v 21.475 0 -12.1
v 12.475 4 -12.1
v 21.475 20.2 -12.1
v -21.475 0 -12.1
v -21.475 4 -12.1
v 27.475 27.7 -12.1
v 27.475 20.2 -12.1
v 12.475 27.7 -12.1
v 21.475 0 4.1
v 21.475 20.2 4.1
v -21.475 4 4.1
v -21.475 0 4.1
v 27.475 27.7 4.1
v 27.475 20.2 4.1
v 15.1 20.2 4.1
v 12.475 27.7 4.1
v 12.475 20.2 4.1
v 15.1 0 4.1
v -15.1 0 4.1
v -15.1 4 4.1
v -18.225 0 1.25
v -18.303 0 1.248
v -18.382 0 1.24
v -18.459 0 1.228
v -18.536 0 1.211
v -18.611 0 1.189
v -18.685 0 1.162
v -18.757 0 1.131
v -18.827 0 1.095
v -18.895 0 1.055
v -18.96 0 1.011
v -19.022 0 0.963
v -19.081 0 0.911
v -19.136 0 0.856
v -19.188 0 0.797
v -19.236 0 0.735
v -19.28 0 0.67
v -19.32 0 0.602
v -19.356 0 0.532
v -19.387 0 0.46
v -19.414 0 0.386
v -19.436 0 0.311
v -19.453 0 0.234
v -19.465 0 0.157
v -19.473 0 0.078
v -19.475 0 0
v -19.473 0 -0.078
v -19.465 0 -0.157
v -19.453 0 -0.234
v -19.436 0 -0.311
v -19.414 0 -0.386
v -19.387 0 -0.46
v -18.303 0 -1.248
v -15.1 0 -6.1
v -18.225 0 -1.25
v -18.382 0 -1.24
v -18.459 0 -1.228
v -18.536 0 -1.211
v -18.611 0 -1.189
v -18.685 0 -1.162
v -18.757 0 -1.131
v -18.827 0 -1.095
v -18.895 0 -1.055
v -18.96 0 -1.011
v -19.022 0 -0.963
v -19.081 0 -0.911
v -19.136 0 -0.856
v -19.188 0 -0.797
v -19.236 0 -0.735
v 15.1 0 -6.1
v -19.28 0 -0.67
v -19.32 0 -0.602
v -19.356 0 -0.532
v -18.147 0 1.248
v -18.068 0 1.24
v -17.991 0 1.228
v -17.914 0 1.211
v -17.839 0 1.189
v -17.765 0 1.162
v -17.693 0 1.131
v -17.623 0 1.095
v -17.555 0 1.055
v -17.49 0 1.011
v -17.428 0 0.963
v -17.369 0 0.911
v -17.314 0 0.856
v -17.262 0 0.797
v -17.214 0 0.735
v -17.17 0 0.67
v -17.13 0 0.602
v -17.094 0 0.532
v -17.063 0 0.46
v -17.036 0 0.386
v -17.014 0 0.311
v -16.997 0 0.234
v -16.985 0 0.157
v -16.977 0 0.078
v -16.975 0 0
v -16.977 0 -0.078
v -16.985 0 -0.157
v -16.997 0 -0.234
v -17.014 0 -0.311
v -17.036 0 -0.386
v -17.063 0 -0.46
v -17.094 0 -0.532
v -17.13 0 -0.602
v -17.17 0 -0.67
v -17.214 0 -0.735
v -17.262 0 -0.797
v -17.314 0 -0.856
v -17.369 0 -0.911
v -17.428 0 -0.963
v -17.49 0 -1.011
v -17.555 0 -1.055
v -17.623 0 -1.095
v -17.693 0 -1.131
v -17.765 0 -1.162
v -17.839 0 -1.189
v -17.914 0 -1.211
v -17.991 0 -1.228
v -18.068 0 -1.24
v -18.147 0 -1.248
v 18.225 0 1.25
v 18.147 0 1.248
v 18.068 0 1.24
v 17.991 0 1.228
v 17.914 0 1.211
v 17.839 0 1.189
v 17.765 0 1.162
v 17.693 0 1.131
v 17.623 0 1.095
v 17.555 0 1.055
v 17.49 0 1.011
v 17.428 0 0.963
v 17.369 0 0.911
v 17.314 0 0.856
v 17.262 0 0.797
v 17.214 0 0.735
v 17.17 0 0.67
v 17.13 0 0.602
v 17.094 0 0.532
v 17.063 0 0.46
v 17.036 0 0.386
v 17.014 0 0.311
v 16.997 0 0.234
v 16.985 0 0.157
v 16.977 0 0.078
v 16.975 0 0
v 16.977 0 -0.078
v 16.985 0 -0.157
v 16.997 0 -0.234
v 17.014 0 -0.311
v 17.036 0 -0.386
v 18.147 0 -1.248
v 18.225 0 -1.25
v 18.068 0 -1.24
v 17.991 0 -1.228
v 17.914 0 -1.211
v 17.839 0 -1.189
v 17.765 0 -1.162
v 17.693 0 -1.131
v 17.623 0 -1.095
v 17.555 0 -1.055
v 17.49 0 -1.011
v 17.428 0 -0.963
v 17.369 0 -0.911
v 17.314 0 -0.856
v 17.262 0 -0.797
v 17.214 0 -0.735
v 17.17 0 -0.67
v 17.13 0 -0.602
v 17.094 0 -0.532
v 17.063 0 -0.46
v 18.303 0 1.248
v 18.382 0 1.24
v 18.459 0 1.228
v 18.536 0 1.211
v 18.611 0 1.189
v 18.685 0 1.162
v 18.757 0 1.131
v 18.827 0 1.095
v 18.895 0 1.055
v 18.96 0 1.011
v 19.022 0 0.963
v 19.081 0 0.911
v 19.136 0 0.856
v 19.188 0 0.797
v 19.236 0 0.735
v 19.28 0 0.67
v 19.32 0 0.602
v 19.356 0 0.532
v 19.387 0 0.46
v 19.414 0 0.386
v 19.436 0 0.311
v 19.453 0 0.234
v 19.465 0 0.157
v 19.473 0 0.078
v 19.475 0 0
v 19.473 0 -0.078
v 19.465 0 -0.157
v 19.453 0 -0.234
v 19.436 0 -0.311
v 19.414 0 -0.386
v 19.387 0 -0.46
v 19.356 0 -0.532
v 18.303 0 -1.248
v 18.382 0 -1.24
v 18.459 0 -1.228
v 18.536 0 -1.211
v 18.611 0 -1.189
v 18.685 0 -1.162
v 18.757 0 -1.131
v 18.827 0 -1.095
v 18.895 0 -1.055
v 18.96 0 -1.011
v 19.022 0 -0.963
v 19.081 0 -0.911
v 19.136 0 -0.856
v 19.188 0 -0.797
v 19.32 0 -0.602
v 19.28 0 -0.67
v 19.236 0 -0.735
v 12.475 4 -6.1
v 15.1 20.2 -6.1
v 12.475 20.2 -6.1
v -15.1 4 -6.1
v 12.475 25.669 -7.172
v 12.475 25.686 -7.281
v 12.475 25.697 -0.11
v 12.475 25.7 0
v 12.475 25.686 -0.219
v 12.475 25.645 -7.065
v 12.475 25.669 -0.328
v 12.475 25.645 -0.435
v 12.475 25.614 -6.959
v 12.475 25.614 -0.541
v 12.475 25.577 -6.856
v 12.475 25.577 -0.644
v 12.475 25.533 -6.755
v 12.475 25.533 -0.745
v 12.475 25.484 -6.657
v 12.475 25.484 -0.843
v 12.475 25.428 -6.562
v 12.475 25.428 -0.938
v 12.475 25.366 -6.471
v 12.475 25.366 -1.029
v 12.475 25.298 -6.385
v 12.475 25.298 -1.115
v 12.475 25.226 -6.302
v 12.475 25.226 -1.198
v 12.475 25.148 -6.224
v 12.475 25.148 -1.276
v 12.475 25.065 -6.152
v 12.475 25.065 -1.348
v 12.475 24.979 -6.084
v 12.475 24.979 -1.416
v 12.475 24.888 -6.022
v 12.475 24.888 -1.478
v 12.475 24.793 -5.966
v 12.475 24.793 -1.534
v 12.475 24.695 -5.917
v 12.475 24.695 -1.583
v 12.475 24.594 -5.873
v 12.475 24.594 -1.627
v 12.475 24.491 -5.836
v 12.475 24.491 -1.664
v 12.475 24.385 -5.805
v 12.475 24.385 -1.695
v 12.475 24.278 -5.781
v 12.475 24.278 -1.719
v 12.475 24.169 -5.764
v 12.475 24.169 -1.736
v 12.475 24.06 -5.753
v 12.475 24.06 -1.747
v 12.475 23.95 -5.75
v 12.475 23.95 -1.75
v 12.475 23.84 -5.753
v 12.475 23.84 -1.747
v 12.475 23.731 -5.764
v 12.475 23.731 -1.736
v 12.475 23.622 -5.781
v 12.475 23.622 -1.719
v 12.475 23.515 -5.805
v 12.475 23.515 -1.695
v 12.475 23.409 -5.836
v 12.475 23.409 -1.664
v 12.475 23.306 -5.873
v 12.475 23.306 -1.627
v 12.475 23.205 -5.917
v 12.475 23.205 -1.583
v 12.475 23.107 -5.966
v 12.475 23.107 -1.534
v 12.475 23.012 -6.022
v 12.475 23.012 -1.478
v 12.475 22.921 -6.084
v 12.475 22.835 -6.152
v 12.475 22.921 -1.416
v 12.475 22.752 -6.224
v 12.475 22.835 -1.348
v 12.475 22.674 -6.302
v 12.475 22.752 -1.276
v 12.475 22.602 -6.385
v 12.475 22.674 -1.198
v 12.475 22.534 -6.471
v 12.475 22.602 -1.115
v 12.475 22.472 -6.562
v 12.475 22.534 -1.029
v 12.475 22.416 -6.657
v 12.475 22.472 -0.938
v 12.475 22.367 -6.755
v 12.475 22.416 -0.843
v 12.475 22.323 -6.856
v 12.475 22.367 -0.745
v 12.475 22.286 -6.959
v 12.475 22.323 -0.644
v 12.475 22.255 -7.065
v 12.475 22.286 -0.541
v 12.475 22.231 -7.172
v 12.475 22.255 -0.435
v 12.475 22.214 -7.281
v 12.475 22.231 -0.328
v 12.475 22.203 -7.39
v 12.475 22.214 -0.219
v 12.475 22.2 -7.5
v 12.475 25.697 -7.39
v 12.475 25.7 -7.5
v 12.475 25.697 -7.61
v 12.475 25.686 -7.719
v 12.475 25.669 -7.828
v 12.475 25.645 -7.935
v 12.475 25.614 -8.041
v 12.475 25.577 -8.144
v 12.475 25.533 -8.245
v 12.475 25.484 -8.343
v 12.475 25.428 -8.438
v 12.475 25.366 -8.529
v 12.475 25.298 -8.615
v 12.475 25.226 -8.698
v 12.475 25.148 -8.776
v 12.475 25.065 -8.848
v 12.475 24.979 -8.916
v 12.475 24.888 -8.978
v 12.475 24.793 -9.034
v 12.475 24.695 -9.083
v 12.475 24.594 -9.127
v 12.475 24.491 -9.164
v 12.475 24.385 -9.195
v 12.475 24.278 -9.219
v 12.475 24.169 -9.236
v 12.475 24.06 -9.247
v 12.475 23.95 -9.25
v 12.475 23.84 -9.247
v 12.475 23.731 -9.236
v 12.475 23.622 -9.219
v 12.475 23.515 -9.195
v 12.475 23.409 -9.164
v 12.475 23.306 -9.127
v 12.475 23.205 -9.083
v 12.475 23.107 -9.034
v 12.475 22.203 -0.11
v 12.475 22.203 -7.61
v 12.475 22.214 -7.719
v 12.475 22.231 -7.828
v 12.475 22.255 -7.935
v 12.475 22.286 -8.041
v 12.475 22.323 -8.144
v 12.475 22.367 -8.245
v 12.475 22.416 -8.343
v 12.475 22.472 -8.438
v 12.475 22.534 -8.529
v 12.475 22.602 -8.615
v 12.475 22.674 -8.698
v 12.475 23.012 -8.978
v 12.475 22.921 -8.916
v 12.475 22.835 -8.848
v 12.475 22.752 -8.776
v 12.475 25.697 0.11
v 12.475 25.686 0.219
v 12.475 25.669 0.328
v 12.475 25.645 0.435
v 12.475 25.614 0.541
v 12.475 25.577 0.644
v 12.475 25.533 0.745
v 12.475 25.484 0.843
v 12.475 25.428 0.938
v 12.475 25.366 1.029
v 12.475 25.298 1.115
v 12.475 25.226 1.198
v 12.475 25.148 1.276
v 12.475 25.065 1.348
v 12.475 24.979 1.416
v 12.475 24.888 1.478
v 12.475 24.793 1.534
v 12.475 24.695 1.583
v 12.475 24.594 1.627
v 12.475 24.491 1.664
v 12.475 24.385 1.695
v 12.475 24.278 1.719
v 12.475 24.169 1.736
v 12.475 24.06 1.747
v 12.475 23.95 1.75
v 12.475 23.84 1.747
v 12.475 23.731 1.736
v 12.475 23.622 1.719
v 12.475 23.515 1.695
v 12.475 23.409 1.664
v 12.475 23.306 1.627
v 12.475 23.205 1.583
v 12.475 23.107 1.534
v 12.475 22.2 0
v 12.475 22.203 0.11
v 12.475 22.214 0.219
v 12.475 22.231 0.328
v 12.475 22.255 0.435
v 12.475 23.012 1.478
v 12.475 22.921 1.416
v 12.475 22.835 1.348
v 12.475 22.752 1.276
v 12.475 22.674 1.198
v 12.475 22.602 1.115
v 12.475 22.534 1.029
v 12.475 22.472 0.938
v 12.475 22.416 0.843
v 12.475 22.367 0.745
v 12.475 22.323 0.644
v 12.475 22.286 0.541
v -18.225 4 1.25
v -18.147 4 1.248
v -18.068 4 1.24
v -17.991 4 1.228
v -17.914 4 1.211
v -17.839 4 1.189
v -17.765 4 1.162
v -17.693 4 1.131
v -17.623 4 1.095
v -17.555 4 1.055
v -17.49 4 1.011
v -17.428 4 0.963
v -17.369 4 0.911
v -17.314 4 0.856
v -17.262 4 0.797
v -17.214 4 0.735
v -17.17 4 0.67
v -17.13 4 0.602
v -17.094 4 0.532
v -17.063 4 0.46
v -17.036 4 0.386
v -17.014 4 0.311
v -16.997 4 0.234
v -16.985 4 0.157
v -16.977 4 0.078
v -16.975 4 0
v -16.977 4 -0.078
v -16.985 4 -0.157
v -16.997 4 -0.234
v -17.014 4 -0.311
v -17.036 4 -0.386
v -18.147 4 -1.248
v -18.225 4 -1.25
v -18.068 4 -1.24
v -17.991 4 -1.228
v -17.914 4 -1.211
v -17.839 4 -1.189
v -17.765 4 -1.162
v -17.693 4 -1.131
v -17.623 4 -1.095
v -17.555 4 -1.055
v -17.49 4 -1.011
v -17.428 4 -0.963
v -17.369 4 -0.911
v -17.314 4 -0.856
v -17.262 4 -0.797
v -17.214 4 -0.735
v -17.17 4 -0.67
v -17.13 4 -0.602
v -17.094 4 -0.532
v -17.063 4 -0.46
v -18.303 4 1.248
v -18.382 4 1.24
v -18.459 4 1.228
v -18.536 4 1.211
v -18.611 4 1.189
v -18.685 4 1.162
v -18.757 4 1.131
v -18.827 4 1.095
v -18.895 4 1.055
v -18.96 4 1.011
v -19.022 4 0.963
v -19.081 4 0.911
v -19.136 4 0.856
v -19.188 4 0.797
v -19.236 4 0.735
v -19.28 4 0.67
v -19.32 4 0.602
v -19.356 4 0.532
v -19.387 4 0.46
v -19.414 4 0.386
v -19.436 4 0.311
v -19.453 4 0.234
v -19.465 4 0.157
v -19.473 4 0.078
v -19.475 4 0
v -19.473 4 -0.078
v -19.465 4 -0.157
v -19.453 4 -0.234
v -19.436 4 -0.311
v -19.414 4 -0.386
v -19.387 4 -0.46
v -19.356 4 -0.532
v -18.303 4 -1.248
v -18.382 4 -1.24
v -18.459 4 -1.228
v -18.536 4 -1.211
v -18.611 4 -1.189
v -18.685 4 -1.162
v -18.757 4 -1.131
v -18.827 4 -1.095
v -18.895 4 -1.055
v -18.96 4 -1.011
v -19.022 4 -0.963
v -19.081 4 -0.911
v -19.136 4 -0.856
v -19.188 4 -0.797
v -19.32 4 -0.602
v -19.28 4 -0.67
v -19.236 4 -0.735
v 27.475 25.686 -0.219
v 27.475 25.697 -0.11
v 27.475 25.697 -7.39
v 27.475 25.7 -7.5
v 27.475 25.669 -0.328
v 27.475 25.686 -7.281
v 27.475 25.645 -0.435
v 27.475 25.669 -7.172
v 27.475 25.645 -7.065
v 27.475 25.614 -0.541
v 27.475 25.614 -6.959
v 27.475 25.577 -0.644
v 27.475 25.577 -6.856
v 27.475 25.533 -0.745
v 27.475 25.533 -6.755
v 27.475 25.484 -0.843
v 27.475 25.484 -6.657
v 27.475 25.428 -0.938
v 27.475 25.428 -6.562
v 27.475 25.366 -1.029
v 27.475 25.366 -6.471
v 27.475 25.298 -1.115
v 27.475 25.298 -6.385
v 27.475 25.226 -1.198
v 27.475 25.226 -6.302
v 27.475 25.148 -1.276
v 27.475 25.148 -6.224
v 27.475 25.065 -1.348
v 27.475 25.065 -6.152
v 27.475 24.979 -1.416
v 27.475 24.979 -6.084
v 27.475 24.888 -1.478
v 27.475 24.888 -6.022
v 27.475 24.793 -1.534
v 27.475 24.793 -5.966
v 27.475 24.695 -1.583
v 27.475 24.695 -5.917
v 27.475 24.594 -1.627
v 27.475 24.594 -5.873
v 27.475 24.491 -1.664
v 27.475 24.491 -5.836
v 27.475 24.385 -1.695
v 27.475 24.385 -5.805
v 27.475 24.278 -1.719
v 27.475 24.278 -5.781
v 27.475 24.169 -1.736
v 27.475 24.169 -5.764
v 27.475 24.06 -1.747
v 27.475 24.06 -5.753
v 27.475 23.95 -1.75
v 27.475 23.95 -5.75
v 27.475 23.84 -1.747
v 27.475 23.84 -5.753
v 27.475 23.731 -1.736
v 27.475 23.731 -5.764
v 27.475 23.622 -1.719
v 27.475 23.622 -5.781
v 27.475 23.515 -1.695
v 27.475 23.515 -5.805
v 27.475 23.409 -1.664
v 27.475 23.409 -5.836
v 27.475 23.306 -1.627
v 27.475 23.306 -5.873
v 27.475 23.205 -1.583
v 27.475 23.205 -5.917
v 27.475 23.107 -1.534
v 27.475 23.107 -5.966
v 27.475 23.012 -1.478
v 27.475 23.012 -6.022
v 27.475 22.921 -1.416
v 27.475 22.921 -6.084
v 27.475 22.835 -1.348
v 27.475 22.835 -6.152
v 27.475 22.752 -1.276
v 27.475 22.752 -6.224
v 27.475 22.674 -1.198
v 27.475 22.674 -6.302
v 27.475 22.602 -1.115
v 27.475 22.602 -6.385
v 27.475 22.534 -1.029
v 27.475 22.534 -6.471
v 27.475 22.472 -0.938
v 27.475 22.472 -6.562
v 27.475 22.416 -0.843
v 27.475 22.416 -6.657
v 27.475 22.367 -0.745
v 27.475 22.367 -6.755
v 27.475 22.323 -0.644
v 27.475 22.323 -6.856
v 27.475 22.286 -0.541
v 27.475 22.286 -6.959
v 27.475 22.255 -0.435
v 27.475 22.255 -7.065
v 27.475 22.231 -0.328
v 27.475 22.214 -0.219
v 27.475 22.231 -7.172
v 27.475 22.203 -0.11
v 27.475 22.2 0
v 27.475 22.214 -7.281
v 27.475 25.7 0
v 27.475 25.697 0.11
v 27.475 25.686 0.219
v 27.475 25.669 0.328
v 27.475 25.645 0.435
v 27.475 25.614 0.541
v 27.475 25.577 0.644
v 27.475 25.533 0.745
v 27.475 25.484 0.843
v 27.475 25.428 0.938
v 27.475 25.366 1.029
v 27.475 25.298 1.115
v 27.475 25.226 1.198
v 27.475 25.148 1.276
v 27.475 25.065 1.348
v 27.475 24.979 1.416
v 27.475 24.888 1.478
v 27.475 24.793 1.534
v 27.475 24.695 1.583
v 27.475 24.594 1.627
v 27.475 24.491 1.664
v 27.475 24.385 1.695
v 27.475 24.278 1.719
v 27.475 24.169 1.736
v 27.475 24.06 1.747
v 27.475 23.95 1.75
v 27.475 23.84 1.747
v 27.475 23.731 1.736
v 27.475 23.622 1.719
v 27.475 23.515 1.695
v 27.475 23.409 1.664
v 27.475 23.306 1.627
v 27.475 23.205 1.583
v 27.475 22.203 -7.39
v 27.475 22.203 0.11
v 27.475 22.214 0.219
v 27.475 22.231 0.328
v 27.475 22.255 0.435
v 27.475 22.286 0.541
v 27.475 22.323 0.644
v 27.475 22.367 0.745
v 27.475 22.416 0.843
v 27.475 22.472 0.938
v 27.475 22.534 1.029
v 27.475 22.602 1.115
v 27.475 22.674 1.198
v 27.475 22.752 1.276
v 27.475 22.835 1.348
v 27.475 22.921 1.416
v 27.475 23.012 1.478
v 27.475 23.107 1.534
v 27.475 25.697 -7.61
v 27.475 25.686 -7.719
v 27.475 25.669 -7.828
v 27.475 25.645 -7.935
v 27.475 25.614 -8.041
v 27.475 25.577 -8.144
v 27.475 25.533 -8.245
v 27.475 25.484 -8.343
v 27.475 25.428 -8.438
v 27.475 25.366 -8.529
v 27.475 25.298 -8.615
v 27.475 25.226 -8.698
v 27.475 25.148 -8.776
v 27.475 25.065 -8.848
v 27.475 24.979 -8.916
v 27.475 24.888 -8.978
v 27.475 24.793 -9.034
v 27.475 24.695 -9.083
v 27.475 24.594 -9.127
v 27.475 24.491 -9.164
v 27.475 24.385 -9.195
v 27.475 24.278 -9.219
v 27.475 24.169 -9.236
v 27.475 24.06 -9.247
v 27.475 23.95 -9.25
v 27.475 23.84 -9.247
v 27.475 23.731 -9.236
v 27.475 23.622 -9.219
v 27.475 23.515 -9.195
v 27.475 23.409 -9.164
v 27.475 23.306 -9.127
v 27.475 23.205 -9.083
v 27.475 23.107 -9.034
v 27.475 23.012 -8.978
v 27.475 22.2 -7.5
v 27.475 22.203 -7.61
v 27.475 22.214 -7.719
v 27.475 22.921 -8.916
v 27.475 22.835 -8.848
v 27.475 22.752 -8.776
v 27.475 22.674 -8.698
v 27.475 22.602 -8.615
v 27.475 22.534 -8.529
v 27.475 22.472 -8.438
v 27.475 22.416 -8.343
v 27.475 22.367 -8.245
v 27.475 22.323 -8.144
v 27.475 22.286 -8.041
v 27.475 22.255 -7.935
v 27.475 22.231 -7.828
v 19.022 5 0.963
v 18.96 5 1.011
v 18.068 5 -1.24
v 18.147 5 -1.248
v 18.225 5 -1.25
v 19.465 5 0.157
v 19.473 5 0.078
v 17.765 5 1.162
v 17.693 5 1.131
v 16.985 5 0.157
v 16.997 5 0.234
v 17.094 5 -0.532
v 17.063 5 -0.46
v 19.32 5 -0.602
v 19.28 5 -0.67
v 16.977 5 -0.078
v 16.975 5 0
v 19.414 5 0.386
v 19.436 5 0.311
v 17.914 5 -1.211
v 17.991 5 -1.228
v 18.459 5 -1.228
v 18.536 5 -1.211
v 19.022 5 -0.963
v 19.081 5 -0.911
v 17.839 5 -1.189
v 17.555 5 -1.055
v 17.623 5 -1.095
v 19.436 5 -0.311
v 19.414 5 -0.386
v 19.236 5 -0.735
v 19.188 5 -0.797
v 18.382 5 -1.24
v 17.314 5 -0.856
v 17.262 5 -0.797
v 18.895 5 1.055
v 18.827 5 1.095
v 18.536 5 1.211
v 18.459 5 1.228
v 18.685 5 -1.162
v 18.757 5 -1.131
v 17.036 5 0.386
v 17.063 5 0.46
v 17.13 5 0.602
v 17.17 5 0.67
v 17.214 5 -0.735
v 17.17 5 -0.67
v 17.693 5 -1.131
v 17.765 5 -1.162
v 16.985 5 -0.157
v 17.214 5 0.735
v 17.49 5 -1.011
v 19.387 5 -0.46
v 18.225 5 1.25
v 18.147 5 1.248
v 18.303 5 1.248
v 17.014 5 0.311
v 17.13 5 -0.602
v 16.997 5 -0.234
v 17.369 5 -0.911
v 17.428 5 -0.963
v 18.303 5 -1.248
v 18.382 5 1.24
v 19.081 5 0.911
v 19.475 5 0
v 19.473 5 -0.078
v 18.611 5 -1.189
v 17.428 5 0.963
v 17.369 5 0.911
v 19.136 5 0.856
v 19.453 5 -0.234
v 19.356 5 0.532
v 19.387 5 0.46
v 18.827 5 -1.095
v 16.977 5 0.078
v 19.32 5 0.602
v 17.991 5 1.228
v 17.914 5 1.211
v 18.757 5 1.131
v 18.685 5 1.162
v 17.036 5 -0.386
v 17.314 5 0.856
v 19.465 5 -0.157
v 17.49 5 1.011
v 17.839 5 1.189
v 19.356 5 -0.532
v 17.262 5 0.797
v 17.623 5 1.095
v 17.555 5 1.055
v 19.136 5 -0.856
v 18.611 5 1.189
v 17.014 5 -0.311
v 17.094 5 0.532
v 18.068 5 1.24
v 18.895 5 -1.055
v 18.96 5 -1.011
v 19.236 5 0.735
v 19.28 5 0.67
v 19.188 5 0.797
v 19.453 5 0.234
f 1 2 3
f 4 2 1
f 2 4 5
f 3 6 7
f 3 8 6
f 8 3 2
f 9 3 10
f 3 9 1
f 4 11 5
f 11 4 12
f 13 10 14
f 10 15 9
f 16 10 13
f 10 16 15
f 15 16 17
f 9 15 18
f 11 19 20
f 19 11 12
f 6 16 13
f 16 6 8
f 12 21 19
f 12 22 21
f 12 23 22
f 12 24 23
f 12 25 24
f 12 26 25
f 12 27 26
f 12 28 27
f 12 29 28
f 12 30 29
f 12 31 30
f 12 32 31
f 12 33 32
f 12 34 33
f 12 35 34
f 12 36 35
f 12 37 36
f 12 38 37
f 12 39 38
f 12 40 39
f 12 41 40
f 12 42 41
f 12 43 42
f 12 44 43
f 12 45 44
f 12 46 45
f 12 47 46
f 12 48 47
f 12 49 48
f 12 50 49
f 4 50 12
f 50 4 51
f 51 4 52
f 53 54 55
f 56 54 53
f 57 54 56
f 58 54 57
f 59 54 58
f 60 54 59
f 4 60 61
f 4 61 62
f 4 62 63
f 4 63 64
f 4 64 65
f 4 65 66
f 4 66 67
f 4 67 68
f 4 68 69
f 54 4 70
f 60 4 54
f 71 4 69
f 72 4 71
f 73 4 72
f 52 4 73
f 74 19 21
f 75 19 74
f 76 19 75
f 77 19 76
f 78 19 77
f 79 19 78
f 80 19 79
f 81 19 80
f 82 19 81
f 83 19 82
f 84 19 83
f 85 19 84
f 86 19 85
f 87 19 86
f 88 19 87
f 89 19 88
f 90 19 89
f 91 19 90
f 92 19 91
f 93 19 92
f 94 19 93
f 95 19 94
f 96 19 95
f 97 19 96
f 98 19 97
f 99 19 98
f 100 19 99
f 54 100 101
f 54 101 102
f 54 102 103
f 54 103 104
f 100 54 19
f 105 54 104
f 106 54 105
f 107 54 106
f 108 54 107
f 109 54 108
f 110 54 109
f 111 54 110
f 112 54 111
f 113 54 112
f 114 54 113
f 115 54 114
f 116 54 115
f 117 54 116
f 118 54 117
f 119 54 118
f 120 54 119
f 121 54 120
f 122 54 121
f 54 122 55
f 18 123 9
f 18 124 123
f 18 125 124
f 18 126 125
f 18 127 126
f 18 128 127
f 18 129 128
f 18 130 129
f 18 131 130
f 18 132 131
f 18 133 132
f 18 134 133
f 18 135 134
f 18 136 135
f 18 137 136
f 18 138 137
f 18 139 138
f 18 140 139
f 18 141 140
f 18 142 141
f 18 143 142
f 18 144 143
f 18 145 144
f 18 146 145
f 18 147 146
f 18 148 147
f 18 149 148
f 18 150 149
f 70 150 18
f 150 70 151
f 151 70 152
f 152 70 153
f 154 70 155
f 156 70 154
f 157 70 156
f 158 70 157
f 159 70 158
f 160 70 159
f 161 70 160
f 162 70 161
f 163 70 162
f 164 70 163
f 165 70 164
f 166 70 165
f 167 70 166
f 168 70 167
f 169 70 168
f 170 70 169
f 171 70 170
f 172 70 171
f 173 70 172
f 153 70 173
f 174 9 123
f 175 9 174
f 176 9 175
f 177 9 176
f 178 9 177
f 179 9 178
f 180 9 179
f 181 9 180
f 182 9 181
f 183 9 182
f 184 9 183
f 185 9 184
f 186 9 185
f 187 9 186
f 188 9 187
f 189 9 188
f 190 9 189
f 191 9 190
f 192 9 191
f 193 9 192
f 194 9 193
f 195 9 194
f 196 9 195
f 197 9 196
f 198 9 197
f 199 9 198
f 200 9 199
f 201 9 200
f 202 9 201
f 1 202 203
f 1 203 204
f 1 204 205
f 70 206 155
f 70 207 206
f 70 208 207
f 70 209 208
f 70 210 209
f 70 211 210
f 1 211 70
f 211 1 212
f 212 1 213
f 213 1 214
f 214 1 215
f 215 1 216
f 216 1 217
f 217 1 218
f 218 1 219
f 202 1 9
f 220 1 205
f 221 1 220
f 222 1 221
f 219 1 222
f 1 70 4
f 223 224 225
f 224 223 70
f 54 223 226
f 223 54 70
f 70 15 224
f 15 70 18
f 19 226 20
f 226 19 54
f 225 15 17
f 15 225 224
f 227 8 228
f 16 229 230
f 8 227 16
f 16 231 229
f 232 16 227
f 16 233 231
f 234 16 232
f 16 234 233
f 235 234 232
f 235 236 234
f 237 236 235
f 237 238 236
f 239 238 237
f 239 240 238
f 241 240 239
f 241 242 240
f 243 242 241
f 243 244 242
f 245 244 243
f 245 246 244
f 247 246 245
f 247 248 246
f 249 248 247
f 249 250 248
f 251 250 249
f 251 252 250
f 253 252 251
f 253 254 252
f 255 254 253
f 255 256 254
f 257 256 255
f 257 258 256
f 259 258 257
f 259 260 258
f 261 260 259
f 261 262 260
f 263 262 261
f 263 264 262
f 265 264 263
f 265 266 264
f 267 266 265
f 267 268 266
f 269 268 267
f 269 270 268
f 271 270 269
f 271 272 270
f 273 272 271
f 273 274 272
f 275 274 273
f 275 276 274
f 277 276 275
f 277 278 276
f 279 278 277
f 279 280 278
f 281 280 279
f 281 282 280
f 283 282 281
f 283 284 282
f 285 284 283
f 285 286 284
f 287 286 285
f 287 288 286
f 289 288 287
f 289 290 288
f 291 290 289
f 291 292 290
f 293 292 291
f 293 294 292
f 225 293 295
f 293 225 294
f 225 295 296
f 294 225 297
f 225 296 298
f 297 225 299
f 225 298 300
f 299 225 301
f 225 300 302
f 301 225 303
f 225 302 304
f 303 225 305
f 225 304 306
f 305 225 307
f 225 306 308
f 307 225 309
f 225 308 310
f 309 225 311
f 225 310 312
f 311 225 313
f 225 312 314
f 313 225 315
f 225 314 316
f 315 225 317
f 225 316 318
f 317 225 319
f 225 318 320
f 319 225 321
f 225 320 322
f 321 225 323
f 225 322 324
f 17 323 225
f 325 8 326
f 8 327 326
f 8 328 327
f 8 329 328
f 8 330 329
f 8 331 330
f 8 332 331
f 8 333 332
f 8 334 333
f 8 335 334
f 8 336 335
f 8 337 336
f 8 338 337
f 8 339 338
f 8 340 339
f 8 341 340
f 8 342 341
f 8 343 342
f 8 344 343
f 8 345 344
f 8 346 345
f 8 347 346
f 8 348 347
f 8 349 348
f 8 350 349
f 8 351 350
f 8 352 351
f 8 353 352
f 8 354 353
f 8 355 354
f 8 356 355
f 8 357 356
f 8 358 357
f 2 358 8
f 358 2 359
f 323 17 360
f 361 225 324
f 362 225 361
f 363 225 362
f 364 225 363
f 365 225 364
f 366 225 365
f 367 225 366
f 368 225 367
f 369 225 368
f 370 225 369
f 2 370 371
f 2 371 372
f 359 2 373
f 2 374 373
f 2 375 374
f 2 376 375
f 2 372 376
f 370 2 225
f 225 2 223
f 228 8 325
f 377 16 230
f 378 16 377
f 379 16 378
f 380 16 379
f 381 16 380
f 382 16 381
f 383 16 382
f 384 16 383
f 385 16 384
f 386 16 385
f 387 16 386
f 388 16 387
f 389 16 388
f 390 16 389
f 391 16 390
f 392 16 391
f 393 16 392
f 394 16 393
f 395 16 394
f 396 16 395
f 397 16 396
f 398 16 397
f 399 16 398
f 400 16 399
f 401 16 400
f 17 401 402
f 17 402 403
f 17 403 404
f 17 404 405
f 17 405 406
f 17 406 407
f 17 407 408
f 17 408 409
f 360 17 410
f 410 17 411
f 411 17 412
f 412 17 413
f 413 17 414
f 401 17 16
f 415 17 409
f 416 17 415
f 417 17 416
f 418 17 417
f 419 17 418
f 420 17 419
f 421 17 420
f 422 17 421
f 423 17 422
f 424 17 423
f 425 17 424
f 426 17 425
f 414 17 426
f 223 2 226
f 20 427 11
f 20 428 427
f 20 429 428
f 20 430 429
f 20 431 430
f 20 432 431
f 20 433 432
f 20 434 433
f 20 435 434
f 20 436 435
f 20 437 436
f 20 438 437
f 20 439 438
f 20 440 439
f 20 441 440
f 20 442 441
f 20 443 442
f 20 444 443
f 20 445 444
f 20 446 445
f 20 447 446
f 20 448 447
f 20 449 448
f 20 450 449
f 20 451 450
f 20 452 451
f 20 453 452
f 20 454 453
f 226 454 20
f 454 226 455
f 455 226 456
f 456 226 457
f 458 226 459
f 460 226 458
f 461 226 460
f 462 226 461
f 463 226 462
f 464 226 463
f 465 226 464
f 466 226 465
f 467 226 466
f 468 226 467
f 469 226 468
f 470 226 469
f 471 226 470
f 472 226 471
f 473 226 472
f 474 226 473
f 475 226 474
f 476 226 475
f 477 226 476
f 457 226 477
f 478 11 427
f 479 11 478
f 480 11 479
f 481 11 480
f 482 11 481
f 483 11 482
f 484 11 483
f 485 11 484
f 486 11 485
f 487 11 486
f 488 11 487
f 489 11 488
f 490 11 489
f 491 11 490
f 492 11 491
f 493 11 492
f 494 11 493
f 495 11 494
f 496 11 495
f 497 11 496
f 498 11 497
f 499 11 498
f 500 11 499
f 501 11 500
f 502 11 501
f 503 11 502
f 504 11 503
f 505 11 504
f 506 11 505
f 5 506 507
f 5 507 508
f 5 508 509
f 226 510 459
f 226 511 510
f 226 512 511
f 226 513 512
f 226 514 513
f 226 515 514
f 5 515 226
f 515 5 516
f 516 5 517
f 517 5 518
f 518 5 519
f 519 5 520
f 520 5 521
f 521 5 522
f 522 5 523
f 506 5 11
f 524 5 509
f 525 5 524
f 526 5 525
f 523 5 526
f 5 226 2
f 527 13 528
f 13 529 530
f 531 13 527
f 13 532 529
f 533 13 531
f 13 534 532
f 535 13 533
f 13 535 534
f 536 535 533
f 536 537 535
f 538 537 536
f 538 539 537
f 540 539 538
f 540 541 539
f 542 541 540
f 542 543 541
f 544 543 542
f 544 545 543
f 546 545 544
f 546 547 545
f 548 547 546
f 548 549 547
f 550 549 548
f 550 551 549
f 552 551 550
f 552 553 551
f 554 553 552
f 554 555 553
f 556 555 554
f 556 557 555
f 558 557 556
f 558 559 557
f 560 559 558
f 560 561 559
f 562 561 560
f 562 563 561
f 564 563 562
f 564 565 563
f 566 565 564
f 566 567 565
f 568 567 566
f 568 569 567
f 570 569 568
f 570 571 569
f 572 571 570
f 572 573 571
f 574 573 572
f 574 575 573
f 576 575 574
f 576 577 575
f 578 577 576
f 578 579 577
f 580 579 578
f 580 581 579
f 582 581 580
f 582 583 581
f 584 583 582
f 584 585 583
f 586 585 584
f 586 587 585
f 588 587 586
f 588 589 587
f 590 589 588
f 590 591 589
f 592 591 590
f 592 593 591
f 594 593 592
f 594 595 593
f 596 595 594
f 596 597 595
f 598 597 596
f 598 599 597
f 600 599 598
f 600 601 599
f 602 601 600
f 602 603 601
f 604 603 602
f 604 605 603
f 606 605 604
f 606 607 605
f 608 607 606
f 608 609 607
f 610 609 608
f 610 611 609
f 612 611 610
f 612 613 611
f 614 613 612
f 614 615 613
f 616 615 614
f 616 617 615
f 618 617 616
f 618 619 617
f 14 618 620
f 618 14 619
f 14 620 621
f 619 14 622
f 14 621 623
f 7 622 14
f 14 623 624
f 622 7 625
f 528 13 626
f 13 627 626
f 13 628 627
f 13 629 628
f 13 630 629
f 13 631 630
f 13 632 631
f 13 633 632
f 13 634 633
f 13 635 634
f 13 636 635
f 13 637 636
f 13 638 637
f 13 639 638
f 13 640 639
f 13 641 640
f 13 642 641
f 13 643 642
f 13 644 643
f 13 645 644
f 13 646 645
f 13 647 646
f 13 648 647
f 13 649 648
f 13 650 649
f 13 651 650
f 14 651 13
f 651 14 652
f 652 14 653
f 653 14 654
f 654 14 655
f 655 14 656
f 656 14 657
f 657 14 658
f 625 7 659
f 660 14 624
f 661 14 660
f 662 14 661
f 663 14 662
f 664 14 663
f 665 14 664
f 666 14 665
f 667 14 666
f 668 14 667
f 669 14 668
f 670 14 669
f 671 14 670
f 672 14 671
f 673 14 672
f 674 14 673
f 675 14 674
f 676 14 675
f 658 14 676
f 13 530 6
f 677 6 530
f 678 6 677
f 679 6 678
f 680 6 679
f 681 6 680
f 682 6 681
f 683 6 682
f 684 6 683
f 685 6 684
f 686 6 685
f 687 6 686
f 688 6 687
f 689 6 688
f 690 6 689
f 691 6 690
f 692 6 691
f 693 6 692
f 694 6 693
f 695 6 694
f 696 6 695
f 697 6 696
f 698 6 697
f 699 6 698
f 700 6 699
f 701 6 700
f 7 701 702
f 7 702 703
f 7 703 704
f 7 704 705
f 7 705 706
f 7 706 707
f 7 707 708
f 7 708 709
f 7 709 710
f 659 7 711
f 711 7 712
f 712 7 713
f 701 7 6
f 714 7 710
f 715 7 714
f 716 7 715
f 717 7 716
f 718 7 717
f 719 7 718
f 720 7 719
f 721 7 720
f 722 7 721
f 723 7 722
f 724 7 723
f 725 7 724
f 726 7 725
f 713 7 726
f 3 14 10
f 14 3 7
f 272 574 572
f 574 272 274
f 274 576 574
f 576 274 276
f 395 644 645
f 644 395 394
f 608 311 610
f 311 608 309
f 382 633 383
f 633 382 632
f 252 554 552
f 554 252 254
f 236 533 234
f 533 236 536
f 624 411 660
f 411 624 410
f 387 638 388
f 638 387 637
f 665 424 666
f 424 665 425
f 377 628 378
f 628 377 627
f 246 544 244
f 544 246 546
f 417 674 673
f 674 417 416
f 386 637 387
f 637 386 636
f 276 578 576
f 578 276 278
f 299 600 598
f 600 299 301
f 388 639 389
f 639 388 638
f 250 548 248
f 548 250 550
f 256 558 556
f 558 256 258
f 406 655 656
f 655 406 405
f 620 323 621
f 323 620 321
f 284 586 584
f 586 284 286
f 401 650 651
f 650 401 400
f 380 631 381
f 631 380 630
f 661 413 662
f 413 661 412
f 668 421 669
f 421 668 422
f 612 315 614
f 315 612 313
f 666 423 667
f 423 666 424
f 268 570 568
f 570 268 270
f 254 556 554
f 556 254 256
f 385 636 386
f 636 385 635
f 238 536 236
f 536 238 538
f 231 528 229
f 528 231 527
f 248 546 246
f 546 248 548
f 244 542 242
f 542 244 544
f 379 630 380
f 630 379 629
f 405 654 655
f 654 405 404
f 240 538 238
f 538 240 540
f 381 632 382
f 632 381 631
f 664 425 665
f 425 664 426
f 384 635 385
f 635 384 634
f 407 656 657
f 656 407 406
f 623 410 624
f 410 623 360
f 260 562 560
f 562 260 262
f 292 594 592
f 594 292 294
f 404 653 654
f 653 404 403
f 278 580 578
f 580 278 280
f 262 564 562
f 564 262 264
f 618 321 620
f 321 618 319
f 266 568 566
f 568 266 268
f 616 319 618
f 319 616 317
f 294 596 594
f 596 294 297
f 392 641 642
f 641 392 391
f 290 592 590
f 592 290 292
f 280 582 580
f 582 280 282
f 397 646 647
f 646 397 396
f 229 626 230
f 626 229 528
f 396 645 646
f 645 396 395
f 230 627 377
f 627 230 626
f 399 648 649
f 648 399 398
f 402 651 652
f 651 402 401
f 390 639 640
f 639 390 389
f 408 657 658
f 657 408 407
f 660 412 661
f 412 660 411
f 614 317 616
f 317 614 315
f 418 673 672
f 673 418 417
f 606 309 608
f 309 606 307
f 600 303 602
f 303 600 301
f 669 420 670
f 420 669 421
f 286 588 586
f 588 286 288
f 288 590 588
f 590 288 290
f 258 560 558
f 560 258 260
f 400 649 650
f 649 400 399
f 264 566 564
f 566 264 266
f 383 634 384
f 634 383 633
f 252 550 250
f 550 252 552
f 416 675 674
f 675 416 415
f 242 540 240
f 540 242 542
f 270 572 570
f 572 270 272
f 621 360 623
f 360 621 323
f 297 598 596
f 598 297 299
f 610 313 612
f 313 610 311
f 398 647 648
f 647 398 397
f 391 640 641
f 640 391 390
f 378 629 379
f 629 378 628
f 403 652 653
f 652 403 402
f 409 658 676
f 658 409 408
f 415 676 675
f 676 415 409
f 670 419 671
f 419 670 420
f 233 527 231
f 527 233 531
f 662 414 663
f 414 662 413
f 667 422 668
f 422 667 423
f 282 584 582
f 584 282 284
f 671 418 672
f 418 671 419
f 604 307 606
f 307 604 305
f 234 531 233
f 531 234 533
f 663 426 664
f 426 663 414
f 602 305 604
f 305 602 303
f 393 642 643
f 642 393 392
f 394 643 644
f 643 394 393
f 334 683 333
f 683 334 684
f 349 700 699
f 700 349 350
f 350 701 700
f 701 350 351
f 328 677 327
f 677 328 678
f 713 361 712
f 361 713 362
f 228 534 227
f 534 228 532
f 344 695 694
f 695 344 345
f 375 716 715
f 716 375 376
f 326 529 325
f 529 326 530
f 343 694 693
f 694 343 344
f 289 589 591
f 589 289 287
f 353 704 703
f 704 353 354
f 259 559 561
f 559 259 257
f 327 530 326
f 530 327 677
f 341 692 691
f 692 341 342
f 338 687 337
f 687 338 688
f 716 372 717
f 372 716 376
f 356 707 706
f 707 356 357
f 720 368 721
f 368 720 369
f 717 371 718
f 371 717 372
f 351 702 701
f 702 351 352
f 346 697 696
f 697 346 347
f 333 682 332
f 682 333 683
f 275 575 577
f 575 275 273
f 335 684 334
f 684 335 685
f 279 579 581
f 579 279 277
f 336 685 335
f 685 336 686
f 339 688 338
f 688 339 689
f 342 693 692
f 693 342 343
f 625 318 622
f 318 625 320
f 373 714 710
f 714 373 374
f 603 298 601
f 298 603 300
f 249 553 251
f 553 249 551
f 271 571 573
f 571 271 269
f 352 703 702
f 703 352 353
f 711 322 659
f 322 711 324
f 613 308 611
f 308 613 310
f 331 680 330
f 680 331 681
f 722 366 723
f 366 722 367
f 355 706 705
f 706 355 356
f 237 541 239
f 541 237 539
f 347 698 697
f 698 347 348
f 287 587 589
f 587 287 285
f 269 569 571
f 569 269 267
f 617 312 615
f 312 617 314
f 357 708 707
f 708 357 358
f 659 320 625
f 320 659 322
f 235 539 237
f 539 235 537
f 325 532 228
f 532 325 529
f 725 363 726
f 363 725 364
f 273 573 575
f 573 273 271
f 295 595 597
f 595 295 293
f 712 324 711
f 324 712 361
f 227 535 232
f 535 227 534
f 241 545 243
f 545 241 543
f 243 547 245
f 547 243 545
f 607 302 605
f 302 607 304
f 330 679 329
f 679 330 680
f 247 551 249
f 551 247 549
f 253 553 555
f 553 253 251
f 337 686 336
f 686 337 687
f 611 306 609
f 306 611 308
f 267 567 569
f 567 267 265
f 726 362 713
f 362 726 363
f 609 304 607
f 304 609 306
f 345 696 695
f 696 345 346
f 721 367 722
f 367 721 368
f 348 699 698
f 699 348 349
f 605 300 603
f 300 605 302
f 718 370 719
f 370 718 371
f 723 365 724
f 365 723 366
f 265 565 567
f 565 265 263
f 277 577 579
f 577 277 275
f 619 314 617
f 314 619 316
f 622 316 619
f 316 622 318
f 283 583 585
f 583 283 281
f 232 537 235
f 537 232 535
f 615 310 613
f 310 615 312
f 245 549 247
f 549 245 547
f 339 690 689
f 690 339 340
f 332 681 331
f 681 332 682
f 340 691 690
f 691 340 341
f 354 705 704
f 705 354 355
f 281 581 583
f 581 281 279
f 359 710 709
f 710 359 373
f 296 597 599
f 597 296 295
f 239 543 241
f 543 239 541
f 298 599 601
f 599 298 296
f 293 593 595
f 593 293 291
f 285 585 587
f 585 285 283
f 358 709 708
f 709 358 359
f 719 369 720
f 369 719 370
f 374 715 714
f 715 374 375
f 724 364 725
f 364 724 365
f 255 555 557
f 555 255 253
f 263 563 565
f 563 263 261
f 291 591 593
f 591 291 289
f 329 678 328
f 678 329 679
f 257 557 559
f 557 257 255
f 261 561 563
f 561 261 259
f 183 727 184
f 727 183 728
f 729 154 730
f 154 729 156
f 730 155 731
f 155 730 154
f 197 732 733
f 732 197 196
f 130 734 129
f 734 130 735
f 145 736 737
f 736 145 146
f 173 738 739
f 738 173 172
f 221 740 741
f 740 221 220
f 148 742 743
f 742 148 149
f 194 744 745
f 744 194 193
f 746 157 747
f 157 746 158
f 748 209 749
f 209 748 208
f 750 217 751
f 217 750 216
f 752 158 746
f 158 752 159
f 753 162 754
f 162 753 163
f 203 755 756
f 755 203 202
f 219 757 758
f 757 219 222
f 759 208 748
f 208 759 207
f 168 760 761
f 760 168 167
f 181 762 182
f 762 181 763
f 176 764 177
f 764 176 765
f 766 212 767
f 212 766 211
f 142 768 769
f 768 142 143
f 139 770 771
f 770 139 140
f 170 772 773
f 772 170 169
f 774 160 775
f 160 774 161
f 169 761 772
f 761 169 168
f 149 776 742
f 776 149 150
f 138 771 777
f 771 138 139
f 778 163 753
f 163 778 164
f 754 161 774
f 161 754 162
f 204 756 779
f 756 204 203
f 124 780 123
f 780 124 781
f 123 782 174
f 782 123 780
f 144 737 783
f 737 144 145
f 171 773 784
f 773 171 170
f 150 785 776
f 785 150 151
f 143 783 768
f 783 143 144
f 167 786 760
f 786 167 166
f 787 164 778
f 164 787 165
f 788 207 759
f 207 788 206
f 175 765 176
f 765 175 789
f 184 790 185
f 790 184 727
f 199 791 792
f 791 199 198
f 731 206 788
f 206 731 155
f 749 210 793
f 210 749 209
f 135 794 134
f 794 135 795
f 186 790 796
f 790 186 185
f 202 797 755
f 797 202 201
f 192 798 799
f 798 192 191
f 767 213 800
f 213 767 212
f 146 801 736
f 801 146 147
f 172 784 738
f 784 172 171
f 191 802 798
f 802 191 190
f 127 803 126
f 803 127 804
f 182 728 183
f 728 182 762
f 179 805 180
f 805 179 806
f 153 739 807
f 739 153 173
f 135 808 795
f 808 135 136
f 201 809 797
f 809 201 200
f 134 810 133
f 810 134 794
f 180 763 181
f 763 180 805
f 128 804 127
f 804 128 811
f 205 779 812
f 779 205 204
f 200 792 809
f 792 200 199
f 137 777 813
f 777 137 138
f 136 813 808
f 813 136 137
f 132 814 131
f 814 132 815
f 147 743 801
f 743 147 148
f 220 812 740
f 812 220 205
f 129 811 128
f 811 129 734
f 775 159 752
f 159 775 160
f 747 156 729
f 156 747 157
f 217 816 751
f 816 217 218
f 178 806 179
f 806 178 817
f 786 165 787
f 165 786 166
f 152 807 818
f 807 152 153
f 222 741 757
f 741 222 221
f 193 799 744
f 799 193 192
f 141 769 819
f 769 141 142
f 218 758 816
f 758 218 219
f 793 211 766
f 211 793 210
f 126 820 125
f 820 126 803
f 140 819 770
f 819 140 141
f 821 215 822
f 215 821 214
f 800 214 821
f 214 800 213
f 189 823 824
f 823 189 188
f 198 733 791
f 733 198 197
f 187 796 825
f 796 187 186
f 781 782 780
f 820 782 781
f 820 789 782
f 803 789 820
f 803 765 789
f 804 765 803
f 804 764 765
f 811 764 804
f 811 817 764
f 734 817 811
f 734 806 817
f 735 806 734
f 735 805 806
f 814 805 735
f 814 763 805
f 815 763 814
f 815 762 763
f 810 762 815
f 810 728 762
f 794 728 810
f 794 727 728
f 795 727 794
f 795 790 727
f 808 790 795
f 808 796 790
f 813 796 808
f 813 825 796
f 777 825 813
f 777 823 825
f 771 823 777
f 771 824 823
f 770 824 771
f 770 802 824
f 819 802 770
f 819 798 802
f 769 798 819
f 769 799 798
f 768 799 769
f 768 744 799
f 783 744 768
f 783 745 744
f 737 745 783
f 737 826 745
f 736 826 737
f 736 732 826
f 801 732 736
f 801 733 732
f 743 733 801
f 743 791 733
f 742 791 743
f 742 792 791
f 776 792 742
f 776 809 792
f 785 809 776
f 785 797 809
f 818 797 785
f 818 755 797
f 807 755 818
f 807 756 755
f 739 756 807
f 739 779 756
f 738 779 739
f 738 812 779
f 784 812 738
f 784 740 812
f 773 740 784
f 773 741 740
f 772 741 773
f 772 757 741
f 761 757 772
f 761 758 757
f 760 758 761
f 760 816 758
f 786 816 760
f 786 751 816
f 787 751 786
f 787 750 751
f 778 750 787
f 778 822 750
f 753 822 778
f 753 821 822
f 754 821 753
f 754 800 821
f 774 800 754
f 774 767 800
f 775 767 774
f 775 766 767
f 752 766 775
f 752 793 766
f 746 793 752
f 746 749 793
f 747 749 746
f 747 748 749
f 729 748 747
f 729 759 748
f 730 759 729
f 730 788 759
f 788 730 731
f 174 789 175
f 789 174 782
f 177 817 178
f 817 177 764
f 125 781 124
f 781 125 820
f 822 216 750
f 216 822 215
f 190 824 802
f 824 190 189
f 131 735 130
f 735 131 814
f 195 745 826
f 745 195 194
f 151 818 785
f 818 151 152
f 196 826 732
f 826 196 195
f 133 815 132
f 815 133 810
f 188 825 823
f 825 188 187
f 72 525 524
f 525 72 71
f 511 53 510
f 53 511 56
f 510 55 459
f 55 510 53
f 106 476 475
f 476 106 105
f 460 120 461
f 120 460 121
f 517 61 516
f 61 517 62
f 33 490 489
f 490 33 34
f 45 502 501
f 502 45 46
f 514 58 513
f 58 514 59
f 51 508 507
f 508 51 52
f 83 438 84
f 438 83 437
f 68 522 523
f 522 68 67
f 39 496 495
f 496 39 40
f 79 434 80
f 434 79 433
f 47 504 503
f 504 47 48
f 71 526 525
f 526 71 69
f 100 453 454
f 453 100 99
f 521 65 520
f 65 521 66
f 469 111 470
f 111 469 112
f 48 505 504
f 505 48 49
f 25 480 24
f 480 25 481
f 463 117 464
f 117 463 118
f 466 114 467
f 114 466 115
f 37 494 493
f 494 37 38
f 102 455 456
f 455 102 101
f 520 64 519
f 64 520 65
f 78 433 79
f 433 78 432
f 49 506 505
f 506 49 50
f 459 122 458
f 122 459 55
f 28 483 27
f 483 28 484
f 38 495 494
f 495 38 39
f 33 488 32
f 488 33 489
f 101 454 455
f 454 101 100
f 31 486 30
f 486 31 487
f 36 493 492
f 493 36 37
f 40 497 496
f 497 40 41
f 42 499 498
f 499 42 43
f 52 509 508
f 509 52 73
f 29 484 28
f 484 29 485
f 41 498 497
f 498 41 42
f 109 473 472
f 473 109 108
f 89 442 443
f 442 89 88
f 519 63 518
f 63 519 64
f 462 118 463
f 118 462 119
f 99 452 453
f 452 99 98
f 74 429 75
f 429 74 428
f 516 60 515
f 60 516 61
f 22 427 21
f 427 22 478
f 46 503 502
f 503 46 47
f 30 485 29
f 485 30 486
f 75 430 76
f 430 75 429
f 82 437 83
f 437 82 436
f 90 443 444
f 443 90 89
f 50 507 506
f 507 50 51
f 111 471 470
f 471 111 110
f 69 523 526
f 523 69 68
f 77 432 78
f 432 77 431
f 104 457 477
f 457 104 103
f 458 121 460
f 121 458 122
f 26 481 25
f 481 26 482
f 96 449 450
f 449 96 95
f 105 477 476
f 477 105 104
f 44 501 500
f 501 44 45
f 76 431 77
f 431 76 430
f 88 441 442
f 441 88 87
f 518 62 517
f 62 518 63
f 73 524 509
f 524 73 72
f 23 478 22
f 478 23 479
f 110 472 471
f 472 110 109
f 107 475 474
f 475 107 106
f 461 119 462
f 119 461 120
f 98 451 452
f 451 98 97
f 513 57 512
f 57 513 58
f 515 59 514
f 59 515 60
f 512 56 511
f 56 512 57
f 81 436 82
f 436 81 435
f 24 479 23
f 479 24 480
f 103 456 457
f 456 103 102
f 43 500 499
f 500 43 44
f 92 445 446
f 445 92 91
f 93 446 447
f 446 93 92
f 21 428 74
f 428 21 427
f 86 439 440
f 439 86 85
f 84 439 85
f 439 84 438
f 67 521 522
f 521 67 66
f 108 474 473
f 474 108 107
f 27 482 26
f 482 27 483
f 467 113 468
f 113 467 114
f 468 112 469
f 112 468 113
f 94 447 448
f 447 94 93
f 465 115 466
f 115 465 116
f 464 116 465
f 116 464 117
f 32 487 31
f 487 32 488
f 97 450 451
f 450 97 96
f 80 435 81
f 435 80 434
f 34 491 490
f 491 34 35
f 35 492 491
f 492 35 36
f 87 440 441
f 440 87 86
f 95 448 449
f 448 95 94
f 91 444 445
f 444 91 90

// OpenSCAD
$fn=100;

wall=2;
clearance=0.2;
arm_thickness=4;

// HS81
servo_len=29.8;
servo_w=12;
servo_hole_h=5.4;         // From edge of servo body to middle of hole
servo_hole_offset=3.125;  // From body to middle of mounting hole
servo_screw_d=2.5;       // M3 self tapping tap hole
servo_hole_to_bottom=20; // distance from the mounting hole to bottom of servo

mounting_screw_d=3.5;     // M3 self tapping through hole
mounting_extra_len=6;
mounting_screw_len=15;
servo_screw_len=5;

mount=[ servo_w + arm_thickness + clearance,
         servo_hole_to_bottom + clearance + wall + mounting_screw_d + wall,
         servo_len + 2 * (clearance + servo_hole_offset + servo_screw_d/2 + wall)
        ];

servo = [ servo_w + clearance, servo_hole_to_bottom + clearance, servo_len + clearance * 2 ];

module body() {
    difference() {
        translate([-mount[0]/2 + arm_thickness, 0, -mount[2]/2]) cube(mount);
        translate([-servo[0]/2, 0, -servo[2]/2]) cube(servo);
        translate([-mount[0]/2 + arm_thickness, arm_thickness, -mount[2] + mount[2]/2-mounting_screw_len+mounting_extra_len ]) cube(mount);
    };
}

module mounting_screw_extra() {
    tapered_cylinder(d0=mounting_screw_d + 0.5, d1=mounting_screw_d + 2*wall, h=mounting_extra_len);
}

module mounting_extra_body() {
    translate([-mount[0]/2 + arm_thickness, mount[1] - wall*2 - mounting_screw_d, mount[2]/2]) cube([mount[0], mounting_screw_d + wall*2, mounting_extra_len]);
}

module servo_hole() {
    rotate([-90, 0, 0]) cylinder(d=servo_screw_d, h=servo_screw_len);
};

module full_mount() {
    difference() {
        union() {
            body();
            mounting_extra_body();
        }
        translate([0, 0, servo_len/2 + servo_hole_offset + clearance]) servo_hole();
        translate([0, 0, -(servo_len/2 + servo_hole_offset + clearance)]) servo_hole();
        translate([0, mount[1] - wall - mounting_screw_d/2, 0]) union() {
            cylinder(d=mounting_screw_d, h=mount[2] + mounting_extra_len);
            translate([arm_thickness + mounting_screw_d, 0, 0]) cylinder(d=mounting_screw_d, h=mount[2] + mounting_extra_len);
        };
    };
}

rotate([0, 90, 0]) 
full_mount();
